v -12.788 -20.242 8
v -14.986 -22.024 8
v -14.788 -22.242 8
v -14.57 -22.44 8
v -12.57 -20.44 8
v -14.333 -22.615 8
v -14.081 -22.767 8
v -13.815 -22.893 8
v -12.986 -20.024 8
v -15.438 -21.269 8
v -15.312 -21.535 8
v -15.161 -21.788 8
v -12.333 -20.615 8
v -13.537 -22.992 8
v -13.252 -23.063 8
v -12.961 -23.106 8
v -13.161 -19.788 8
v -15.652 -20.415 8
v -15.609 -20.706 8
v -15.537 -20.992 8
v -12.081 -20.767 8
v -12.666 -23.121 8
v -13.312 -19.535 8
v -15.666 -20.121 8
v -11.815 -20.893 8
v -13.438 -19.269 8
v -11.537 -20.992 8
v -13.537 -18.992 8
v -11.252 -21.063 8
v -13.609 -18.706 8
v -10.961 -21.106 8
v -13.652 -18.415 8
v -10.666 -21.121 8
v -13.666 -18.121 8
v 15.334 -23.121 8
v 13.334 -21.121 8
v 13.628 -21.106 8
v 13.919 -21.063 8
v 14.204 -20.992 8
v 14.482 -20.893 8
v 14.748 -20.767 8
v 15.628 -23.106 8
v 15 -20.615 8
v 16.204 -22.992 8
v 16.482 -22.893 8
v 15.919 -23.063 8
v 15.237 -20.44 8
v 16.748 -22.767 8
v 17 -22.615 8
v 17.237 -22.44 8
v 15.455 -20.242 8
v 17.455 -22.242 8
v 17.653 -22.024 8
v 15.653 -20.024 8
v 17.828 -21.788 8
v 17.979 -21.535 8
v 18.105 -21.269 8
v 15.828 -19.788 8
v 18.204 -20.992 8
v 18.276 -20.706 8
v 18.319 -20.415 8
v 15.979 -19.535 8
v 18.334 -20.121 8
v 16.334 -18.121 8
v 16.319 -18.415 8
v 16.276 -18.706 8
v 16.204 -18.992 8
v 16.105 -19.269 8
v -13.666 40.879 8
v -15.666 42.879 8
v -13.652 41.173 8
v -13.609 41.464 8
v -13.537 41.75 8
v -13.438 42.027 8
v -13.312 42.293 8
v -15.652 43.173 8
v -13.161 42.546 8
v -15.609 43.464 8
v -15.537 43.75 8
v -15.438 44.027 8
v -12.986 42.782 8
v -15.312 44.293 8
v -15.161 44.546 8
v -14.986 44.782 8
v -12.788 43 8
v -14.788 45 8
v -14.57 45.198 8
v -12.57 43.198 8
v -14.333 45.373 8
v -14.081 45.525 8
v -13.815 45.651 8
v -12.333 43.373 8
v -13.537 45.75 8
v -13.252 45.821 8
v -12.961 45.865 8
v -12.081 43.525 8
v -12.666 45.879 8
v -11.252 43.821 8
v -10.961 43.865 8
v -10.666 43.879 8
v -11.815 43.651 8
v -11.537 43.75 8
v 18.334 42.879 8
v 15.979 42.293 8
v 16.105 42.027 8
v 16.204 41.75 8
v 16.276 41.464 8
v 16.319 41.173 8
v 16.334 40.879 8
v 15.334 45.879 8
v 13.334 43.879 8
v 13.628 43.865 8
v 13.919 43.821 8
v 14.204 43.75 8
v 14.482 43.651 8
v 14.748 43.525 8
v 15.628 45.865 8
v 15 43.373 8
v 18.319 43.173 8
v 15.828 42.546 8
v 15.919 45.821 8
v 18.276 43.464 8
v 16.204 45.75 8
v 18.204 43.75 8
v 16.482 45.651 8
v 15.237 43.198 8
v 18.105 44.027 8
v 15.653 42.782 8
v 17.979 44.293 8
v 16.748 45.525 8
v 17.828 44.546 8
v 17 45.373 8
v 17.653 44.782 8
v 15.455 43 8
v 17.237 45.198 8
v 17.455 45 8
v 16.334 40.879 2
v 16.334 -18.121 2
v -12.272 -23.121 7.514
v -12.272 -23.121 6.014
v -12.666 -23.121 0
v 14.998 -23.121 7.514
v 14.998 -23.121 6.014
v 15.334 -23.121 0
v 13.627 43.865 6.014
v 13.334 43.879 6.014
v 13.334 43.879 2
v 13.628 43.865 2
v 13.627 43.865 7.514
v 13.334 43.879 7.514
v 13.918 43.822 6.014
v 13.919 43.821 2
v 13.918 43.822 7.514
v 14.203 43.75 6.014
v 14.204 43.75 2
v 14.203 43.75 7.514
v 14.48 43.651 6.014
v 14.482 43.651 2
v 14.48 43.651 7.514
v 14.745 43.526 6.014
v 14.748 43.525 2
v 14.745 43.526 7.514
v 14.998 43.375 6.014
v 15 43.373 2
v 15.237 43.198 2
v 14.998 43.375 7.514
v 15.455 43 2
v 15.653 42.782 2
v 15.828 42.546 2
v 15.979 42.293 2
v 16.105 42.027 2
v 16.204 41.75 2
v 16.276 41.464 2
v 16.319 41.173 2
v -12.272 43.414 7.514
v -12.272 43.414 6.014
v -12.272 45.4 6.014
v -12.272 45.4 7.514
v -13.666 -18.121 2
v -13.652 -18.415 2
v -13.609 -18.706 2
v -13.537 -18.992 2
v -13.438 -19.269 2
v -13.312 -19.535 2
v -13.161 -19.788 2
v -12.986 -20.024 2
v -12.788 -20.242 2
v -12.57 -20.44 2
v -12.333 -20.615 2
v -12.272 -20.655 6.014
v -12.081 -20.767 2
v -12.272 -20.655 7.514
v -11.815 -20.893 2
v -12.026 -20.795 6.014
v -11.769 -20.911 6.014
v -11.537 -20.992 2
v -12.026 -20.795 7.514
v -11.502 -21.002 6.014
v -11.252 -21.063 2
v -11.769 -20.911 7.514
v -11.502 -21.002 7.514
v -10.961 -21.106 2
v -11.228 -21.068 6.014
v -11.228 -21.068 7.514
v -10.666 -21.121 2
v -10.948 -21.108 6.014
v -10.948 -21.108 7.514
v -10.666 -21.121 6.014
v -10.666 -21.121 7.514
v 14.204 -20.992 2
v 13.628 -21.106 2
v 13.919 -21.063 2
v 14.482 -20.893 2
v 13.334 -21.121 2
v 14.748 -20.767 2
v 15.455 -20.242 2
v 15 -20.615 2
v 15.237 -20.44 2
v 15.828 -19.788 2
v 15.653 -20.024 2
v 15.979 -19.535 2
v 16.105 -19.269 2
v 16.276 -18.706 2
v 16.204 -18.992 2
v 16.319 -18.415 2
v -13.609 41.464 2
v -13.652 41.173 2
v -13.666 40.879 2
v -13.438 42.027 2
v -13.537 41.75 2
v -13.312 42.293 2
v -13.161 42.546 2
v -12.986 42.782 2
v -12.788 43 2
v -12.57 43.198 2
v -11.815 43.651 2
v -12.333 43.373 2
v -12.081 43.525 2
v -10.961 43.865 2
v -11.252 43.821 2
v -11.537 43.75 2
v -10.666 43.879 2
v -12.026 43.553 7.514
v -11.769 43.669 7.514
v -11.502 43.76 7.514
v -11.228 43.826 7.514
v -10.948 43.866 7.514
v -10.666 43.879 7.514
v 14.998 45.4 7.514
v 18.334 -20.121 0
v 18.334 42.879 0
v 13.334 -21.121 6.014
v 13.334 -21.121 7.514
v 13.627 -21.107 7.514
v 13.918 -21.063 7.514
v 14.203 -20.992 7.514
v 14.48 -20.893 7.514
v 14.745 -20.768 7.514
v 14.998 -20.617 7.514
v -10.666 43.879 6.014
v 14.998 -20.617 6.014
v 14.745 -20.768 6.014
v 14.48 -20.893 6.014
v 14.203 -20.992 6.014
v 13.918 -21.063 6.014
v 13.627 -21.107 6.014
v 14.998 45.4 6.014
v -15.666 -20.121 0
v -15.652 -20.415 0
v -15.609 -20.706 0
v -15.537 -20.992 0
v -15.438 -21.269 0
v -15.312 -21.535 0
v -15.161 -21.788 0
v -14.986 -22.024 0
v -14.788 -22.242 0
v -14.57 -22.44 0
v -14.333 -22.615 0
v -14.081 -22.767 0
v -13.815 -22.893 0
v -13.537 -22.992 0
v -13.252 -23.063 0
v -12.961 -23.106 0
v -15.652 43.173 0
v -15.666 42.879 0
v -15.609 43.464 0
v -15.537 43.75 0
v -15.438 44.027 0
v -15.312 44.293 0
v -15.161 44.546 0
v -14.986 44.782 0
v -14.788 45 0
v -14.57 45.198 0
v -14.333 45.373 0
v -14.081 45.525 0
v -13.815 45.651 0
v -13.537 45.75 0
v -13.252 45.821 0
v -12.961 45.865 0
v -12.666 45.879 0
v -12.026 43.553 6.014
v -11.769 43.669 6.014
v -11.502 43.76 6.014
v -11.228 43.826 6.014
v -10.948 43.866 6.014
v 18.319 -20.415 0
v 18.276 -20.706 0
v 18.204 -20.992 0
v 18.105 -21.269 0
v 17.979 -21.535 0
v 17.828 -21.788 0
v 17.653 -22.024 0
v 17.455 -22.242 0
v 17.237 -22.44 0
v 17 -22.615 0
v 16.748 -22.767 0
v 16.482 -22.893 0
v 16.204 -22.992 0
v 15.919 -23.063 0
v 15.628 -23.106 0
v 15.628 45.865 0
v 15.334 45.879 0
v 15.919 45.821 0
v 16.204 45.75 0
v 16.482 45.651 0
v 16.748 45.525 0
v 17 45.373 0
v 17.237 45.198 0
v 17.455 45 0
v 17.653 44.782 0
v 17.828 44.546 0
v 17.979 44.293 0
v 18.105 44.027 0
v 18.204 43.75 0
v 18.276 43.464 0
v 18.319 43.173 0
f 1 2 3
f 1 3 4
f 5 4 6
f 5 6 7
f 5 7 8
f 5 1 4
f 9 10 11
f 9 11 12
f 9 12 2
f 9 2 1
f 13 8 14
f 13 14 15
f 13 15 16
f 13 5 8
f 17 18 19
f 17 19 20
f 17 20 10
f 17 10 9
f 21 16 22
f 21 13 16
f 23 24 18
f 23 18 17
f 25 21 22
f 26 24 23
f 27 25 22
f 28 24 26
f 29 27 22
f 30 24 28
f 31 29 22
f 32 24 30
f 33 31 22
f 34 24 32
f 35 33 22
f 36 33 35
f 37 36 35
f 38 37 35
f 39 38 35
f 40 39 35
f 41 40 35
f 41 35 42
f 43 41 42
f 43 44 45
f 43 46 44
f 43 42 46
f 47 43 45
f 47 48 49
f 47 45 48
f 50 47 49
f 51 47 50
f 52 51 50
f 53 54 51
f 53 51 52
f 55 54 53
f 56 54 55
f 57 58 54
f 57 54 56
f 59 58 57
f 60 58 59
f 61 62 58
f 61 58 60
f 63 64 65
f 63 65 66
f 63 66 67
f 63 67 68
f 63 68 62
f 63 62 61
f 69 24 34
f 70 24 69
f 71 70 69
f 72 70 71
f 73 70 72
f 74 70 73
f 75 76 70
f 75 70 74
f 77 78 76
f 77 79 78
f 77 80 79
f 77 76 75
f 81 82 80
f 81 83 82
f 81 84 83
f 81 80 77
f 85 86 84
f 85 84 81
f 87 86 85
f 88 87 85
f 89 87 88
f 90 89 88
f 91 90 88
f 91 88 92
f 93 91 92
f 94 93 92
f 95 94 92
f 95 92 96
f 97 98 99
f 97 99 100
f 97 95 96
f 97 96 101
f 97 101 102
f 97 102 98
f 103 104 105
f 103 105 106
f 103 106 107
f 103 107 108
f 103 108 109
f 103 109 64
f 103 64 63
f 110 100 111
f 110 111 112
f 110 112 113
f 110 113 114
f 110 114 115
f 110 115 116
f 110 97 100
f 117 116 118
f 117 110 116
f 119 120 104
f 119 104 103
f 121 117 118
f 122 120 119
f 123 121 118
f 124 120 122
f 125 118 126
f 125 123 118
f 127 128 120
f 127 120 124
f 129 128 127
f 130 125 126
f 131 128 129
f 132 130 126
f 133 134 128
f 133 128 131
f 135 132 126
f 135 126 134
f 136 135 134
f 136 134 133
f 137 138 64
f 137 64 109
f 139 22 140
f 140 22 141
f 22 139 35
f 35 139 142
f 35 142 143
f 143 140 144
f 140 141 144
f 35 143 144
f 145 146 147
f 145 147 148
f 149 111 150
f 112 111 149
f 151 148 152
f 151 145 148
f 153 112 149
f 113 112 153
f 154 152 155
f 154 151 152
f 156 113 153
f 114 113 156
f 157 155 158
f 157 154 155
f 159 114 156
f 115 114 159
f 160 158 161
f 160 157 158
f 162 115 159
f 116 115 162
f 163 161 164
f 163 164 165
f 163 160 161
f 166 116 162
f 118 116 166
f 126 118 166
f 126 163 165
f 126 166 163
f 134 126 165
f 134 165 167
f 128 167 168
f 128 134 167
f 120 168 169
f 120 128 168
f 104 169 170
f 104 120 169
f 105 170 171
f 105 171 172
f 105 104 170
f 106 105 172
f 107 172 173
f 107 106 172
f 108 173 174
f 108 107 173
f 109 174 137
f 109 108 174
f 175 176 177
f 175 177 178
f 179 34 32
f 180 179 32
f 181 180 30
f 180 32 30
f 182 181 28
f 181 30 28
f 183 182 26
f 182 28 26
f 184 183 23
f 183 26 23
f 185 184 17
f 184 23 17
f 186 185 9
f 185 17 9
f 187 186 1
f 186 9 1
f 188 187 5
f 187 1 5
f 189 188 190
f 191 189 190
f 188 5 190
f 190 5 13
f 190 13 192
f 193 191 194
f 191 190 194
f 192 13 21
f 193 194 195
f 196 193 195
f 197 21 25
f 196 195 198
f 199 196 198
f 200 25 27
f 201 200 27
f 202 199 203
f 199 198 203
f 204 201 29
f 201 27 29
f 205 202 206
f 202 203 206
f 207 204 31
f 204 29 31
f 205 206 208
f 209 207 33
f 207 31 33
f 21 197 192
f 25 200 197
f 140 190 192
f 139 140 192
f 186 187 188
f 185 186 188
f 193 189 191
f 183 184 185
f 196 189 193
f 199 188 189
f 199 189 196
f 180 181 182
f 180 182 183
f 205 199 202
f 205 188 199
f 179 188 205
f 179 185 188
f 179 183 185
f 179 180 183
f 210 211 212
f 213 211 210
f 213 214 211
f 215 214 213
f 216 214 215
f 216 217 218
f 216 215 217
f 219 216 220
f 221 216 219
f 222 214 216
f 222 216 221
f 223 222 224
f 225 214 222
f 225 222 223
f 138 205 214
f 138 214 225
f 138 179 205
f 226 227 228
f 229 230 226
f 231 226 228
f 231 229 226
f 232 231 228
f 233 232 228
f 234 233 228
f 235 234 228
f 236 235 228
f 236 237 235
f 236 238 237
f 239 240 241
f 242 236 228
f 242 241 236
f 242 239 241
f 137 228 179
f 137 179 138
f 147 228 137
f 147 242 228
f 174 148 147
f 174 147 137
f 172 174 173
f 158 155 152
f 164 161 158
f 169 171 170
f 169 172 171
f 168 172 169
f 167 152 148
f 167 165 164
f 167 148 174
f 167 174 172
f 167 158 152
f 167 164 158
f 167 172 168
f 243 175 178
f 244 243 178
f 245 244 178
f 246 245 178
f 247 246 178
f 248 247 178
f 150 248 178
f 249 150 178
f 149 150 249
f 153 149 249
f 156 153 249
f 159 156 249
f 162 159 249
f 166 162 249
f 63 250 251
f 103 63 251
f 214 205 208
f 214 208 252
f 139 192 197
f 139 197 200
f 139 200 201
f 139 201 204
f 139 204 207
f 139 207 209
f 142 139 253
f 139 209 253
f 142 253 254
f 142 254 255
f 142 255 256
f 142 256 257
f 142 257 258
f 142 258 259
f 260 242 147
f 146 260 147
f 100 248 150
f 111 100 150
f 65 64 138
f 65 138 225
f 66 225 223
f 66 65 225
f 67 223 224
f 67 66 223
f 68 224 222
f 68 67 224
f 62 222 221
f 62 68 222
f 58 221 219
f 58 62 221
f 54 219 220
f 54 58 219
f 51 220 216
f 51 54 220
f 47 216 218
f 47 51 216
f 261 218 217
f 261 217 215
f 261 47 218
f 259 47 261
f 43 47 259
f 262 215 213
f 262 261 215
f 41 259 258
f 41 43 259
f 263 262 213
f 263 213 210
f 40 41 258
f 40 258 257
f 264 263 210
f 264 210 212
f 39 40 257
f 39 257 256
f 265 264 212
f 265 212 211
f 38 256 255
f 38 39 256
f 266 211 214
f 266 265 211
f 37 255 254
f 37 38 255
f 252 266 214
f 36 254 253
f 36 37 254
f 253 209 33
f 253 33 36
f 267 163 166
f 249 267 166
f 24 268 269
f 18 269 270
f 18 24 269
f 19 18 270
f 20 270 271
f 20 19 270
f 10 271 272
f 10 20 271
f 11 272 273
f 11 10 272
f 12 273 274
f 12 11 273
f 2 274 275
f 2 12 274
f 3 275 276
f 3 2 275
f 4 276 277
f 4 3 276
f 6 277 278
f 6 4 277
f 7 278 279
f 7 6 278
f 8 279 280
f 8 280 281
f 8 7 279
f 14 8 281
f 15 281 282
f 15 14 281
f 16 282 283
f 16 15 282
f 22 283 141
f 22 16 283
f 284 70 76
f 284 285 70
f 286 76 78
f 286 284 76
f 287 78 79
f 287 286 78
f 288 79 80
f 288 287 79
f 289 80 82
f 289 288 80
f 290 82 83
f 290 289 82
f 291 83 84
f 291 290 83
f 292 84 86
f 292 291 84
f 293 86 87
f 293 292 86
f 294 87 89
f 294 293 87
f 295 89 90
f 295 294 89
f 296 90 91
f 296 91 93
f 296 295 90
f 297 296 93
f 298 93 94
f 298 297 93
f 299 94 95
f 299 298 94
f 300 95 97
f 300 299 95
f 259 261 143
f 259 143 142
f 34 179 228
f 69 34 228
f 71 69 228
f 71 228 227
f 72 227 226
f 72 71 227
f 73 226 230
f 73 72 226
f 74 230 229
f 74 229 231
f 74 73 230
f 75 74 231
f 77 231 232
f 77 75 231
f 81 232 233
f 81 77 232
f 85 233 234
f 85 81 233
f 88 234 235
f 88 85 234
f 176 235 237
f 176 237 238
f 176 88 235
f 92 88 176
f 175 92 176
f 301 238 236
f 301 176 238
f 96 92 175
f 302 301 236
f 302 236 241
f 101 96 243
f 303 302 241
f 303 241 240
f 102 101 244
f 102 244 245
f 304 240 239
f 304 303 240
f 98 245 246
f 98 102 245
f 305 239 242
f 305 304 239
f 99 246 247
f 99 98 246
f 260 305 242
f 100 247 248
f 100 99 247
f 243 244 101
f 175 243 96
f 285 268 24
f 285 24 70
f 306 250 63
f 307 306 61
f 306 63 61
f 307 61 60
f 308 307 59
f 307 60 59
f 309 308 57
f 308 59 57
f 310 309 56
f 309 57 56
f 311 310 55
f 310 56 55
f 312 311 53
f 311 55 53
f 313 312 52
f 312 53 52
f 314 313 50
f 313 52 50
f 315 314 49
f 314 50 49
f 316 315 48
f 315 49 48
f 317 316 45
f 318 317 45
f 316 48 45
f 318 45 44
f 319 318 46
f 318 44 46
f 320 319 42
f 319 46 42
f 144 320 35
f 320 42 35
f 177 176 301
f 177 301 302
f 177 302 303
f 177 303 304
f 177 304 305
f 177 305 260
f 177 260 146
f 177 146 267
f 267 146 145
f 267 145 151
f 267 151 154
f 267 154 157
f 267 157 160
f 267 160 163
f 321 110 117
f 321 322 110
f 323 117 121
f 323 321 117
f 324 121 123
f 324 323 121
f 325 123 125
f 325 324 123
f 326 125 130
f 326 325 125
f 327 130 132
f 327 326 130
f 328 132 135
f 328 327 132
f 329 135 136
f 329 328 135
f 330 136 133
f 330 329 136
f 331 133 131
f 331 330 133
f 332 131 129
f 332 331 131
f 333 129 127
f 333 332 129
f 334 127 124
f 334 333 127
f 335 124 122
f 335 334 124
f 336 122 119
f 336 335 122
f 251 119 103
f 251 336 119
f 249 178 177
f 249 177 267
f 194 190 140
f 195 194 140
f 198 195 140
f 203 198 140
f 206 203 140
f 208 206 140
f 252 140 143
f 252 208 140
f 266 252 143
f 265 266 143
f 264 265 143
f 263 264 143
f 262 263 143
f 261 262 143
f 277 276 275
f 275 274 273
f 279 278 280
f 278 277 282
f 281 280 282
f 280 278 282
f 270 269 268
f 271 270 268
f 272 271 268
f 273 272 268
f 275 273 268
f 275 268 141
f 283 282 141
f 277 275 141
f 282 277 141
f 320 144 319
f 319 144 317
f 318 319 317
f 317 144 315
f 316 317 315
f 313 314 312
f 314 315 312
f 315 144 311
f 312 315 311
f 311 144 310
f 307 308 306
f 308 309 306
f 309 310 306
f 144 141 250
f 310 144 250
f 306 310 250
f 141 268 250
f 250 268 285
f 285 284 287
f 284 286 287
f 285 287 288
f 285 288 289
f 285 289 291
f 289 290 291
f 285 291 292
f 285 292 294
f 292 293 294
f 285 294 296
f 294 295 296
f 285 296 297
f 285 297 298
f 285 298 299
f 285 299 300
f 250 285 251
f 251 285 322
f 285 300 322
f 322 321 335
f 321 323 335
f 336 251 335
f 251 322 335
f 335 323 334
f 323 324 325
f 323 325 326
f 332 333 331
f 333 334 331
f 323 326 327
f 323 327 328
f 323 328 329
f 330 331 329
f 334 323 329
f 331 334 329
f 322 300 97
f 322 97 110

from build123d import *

# Parameters (mm, degrees)
F1_W     = 34
F1_H     = 69
F1_W_2   = 30
F1_H_2   = 65
F2_DEPTH = 8
F3_DEPTH = 2
F4_R     = 3
F5_W     = 27.269229
F5_H     = 1.5
F6_DEPTH = 25
F7_DEPTH = 45.4


with BuildPart() as f2:
    # F1 (on face) → F2 (new body)
    with BuildSketch(Plane.XY):
        with Locations((1.3335, 11.379073)):
            Rectangle(F1_W, F1_H)
        with Locations((1.3335, 11.379073)):
            Rectangle(F1_W_2, F1_H_2, mode=Mode.SUBTRACT)
    extrude(amount=F2_DEPTH)

    # F1 (on face) → F3 (join)
    with BuildSketch(Plane.XY):
        with Locations((1.3335, 11.379073)):
            Rectangle(F1_W, F1_H)
    extrude(amount=F3_DEPTH)

    # F4
    f4_edges = [f2.edges().sort_by_distance(p)[0] for p in [
        (-15.6665, 45.879073, 4),
        (18.3335, 45.879073, 4),
        (18.3335, -23.120927, 4),
        (-15.6665, -23.120927, 4),
        (-13.6665, 43.879073, 5),
        (16.3335, 43.879073, 5),
        (16.3335, -21.120927, 5),
        (-13.6665, -21.120927, 5),
    ]]
    fillet(f4_edges, radius=F4_R)

    # F5 (on Front) → F6 (cut)
    with BuildSketch(Plane.XZ):
        with Locations((1.363065, 6.764378)):
            Rectangle(F5_W, F5_H)
    extrude(amount=F6_DEPTH, mode=Mode.SUBTRACT)

    # F5 (on Front) → F7 (cut)
    with BuildSketch(Plane.XZ):
        with Locations((1.363065, 6.764378)):
            Rectangle(F5_W, F5_H)
    extrude(amount=-F7_DEPTH, mode=Mode.SUBTRACT)


solid = f2.part
